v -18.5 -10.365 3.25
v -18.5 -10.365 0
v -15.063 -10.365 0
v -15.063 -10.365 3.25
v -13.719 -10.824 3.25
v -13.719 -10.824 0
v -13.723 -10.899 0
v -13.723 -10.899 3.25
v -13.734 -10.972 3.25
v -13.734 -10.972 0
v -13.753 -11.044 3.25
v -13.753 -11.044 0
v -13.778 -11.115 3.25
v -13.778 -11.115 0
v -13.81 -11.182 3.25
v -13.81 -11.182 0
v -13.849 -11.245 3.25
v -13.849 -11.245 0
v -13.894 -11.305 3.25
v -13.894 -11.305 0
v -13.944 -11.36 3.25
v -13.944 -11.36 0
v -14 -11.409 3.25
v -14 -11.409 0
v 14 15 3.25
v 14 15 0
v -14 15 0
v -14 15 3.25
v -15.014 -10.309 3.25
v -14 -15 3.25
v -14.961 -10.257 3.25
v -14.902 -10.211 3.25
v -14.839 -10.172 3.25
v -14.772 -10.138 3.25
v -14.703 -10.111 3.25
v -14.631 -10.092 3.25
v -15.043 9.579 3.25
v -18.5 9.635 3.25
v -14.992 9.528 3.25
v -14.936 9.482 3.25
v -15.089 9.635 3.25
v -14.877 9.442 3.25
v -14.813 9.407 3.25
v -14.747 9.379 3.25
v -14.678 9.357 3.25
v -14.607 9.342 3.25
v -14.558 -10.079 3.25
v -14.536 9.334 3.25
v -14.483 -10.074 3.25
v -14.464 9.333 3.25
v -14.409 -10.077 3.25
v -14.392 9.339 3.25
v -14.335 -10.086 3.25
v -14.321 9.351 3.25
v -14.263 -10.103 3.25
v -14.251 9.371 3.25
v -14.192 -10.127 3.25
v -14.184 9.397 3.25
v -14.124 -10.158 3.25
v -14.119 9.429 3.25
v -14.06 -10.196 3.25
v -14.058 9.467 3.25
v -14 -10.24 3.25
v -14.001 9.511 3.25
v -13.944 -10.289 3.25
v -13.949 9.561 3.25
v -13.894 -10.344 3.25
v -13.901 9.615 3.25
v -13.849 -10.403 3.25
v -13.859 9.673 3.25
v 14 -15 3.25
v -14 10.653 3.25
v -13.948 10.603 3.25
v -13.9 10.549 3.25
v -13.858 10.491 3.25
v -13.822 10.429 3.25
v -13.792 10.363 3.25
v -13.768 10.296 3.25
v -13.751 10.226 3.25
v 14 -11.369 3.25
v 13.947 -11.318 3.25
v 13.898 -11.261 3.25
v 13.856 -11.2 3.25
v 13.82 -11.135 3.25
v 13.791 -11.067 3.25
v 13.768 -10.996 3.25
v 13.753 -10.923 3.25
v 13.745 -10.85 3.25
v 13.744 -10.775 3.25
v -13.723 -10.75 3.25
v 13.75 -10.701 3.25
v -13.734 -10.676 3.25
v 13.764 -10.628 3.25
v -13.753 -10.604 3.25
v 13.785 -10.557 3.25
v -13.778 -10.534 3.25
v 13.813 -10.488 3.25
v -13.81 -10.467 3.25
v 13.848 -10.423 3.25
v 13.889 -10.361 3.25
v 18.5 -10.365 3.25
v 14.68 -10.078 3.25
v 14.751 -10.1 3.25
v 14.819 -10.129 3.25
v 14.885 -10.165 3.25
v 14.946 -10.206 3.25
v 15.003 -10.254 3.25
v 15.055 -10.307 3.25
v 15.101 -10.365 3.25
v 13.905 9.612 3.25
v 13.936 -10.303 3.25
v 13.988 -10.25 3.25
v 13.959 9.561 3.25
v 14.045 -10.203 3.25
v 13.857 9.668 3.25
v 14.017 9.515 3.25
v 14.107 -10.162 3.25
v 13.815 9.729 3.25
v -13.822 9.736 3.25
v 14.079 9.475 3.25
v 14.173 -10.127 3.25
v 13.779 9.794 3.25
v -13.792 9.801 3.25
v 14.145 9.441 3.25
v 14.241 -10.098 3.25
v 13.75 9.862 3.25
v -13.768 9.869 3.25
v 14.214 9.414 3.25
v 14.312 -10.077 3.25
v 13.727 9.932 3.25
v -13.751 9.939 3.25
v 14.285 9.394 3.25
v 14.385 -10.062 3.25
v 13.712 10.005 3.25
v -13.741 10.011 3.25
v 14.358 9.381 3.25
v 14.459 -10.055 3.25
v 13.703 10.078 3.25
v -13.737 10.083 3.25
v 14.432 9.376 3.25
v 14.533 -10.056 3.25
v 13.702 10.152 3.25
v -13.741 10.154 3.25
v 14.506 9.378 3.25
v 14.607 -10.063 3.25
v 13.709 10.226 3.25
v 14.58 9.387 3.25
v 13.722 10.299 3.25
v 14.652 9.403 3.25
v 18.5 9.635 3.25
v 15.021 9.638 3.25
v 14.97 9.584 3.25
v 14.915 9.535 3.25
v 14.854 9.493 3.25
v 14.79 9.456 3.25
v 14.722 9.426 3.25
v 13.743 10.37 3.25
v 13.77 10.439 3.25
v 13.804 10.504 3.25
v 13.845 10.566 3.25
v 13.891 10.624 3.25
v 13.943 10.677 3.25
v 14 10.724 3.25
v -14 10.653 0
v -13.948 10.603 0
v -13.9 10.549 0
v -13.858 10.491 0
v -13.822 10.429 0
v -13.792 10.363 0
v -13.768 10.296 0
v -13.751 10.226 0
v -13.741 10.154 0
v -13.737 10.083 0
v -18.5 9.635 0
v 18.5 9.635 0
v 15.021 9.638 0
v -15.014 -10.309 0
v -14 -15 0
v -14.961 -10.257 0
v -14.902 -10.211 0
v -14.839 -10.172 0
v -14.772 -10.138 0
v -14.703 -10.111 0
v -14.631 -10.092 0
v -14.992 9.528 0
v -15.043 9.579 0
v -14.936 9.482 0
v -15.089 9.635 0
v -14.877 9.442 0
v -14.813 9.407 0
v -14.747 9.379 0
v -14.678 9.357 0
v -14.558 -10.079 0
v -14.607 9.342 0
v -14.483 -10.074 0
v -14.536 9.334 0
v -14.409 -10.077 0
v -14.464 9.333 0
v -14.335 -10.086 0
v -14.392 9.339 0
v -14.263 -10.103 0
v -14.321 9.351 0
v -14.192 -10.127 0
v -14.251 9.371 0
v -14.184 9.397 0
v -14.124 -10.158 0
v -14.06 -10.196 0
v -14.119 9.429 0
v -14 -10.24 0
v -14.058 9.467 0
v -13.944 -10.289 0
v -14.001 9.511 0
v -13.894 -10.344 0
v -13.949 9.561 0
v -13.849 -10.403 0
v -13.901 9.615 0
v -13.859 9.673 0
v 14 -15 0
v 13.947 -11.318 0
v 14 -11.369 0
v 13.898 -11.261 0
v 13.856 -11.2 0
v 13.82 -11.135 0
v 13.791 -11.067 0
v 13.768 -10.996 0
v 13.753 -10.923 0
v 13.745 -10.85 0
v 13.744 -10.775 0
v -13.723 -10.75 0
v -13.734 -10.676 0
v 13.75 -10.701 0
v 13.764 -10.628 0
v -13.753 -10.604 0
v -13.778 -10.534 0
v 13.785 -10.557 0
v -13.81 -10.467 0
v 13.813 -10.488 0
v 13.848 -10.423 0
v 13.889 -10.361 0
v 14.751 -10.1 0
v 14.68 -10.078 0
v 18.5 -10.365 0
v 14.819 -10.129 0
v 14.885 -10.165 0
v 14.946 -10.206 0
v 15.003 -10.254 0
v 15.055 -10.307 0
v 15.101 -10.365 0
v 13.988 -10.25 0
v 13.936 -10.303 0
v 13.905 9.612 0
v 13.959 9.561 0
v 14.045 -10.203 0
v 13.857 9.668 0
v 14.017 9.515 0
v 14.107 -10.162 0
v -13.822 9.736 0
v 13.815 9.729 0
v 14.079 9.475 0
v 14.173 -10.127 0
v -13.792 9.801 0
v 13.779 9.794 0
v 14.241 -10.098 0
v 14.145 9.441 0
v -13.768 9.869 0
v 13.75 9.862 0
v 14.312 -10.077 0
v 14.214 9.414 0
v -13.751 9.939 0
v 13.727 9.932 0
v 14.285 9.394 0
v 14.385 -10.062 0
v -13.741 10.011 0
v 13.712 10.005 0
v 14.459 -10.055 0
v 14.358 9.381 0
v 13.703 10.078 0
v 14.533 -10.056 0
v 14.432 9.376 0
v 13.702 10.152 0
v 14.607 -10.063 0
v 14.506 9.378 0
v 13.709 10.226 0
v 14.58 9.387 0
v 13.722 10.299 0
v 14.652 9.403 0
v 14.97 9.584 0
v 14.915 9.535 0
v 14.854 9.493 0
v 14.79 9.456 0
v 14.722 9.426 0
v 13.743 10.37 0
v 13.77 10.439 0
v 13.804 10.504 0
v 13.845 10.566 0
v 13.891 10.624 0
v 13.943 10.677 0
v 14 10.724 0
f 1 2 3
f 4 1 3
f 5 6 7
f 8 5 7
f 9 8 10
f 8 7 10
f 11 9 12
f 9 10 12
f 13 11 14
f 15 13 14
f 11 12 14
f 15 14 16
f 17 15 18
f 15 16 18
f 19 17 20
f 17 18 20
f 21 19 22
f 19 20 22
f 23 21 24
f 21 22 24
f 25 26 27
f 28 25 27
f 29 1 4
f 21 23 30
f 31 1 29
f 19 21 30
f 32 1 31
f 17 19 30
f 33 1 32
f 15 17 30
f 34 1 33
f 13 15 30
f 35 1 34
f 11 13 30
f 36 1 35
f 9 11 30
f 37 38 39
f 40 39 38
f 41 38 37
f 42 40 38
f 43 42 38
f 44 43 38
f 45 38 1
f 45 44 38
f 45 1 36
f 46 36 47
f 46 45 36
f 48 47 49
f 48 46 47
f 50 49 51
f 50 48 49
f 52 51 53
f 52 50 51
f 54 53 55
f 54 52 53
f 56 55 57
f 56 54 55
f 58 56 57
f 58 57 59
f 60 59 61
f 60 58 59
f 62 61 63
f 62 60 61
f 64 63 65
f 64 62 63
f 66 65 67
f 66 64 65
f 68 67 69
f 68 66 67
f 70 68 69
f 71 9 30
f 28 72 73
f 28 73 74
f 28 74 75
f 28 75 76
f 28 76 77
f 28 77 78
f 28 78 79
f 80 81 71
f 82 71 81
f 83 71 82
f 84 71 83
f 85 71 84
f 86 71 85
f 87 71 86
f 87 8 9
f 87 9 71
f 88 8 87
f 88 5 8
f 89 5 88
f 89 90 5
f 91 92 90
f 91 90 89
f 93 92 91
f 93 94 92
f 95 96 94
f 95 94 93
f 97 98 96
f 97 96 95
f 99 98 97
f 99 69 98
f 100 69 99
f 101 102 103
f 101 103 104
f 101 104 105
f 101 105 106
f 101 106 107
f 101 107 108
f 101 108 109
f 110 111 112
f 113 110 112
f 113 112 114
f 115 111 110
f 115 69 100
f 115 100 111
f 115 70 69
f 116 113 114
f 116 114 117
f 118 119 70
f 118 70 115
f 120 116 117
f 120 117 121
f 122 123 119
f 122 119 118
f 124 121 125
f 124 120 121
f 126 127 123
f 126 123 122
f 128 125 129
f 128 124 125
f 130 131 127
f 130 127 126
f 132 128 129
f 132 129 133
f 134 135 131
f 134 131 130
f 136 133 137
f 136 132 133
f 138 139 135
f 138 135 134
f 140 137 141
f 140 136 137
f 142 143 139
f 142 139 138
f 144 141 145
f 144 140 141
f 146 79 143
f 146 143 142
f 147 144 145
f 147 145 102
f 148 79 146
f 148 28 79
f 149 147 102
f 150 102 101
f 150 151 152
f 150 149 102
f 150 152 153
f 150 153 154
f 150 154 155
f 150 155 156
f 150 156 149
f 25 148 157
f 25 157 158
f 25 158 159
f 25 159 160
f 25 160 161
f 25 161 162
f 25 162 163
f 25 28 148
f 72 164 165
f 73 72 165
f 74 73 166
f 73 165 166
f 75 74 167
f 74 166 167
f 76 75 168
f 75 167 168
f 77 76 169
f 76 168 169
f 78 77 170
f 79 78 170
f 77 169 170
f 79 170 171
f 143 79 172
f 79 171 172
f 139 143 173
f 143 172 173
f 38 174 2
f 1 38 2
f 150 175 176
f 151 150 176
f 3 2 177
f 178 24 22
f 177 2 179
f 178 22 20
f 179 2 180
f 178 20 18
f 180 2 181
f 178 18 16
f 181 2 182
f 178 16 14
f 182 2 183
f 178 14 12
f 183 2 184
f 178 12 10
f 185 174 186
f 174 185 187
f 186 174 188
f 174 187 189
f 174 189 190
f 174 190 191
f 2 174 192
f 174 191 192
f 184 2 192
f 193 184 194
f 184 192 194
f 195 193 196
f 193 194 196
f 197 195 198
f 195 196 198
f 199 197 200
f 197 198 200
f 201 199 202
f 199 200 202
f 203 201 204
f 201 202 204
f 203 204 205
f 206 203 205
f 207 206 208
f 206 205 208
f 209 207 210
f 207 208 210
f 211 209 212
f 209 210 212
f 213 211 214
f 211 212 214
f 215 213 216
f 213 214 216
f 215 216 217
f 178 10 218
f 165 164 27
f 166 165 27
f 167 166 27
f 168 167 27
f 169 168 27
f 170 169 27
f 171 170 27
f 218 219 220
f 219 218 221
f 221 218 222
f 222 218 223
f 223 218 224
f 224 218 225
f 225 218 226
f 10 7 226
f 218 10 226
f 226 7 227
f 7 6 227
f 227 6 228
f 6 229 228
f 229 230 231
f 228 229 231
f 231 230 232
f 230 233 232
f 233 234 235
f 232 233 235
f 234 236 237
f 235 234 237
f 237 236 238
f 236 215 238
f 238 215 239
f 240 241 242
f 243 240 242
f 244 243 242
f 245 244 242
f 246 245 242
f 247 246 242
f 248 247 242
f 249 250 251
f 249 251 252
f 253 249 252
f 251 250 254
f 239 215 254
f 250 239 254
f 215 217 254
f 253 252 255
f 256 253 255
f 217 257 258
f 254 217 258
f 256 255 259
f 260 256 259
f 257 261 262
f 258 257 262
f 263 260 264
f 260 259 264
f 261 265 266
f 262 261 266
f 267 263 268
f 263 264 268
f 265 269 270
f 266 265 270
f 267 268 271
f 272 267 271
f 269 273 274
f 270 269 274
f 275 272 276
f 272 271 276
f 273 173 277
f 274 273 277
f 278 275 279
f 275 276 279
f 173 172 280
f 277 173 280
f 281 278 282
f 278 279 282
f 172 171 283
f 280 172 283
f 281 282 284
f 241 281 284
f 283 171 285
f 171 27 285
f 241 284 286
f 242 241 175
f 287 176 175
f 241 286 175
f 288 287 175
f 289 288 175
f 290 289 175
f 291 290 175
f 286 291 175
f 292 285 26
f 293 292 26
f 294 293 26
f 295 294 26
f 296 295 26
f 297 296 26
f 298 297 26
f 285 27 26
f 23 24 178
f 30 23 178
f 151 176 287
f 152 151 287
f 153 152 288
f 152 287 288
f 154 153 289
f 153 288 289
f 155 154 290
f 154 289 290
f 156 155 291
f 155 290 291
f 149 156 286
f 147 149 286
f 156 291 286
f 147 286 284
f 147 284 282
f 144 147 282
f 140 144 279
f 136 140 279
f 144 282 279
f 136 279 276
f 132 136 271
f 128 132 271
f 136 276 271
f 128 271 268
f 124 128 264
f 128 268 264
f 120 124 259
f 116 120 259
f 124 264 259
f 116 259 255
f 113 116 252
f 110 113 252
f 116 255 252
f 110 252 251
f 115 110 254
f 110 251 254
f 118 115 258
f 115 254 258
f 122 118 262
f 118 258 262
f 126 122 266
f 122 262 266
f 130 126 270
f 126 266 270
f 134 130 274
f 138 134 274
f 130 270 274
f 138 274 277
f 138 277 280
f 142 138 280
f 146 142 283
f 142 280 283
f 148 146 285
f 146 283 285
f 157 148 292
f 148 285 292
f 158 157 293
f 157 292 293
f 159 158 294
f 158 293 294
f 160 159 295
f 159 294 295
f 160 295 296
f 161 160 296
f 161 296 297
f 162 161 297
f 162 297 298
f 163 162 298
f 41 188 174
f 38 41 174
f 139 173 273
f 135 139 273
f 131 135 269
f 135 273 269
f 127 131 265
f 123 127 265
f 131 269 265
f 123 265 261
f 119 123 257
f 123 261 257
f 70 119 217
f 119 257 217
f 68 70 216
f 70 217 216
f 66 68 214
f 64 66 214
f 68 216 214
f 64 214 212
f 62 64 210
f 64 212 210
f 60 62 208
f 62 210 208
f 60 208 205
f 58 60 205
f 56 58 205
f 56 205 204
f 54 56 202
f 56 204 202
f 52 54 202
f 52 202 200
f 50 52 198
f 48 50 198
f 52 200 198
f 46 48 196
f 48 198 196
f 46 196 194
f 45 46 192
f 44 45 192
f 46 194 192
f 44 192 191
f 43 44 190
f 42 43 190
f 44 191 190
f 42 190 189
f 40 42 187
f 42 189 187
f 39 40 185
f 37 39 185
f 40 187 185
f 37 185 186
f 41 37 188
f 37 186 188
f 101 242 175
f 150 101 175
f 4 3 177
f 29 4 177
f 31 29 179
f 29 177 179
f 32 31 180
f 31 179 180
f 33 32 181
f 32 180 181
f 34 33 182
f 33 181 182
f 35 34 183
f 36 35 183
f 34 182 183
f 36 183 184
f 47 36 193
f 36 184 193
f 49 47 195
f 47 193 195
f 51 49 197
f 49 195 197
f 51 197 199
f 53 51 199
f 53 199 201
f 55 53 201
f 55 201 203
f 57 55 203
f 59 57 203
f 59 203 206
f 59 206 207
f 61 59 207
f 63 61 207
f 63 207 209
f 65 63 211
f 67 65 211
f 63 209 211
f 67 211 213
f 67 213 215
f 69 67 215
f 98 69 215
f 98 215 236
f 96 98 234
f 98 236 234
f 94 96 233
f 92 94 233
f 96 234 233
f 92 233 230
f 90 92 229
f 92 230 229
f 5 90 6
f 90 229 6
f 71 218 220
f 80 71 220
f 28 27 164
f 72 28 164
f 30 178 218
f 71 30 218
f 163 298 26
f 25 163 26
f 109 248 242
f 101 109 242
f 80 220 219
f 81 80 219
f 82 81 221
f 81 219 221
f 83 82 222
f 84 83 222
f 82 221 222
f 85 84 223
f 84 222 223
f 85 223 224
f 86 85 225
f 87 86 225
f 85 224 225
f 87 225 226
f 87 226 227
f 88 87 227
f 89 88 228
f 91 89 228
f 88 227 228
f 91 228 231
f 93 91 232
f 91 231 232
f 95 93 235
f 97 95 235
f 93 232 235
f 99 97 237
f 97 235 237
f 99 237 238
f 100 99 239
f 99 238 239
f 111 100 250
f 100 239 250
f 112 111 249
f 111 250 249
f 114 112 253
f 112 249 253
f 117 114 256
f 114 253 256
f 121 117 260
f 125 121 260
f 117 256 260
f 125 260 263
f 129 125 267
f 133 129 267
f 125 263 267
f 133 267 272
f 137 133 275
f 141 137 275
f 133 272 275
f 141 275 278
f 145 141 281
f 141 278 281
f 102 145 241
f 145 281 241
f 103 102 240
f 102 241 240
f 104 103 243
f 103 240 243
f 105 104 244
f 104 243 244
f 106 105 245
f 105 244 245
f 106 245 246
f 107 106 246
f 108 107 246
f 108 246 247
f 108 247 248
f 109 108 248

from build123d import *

# Parameters (mm, degrees)
F1_DEPTH = 3.25


# Not quite as in the source:
# - a feature names something its author has since deleted; it is built from what else it names


with BuildPart() as f1:
    # F0 (on Top) → F1 (new body)
    with BuildSketch(Plane.XY):
        with BuildLine():
            Line((-15.0887755982, 9.6346731841), (-18.5, 9.6346731841))
            Line((-18.5, 9.6346731841), (-18.5, -10.3653268159))
            Line((-18.5, -10.3653268159), (-15.0627288748, -10.3653268159))
            ThreePointArc((-15.0627288748, -10.3653268159), (-14.2270313471, -10.1144637876), (-13.719482936, -10.824194178))
            ThreePointArc((-13.719482936, -10.824194178), (-13.7932388225, -11.1485302676), (-14, -11.4090751683))
            Line((-14, -11.4090751683), (-14, -15))
            Line((-14, -15), (14, -15))
            Line((14, -15), (14, -11.3693879251))
            ThreePointArc((14, -11.3693879251), (13.9880219466, -10.2502281458), (15.1013118376, -10.3653268159))
            Line((15.1013118376, -10.3653268159), (18.5, -10.3653268159))
            Line((18.5, -10.3653268159), (18.5, 9.6346731841))
            Line((18.5, 9.6346731841), (15.021365697, 9.6376556492))
            ThreePointArc((15.021365697, 9.6376556492), (13.9052912015, 9.611890406), (14, 10.7242376408))
            Line((14, 10.7242376408), (14, 15))
            Line((14, 15), (-14, 15))
            Line((-14, 15), (-14, 10.6527720123))
            ThreePointArc((-14, 10.6527720123), (-13.8060615496, 10.3964917422), (-13.7372004166, 10.082565248))
            ThreePointArc((-13.7372004166, 10.082565248), (-14.251278169, 9.3706377987), (-15.0887755982, 9.6346731841))
        make_face()
    extrude(amount=F1_DEPTH)


solid = f1.part
